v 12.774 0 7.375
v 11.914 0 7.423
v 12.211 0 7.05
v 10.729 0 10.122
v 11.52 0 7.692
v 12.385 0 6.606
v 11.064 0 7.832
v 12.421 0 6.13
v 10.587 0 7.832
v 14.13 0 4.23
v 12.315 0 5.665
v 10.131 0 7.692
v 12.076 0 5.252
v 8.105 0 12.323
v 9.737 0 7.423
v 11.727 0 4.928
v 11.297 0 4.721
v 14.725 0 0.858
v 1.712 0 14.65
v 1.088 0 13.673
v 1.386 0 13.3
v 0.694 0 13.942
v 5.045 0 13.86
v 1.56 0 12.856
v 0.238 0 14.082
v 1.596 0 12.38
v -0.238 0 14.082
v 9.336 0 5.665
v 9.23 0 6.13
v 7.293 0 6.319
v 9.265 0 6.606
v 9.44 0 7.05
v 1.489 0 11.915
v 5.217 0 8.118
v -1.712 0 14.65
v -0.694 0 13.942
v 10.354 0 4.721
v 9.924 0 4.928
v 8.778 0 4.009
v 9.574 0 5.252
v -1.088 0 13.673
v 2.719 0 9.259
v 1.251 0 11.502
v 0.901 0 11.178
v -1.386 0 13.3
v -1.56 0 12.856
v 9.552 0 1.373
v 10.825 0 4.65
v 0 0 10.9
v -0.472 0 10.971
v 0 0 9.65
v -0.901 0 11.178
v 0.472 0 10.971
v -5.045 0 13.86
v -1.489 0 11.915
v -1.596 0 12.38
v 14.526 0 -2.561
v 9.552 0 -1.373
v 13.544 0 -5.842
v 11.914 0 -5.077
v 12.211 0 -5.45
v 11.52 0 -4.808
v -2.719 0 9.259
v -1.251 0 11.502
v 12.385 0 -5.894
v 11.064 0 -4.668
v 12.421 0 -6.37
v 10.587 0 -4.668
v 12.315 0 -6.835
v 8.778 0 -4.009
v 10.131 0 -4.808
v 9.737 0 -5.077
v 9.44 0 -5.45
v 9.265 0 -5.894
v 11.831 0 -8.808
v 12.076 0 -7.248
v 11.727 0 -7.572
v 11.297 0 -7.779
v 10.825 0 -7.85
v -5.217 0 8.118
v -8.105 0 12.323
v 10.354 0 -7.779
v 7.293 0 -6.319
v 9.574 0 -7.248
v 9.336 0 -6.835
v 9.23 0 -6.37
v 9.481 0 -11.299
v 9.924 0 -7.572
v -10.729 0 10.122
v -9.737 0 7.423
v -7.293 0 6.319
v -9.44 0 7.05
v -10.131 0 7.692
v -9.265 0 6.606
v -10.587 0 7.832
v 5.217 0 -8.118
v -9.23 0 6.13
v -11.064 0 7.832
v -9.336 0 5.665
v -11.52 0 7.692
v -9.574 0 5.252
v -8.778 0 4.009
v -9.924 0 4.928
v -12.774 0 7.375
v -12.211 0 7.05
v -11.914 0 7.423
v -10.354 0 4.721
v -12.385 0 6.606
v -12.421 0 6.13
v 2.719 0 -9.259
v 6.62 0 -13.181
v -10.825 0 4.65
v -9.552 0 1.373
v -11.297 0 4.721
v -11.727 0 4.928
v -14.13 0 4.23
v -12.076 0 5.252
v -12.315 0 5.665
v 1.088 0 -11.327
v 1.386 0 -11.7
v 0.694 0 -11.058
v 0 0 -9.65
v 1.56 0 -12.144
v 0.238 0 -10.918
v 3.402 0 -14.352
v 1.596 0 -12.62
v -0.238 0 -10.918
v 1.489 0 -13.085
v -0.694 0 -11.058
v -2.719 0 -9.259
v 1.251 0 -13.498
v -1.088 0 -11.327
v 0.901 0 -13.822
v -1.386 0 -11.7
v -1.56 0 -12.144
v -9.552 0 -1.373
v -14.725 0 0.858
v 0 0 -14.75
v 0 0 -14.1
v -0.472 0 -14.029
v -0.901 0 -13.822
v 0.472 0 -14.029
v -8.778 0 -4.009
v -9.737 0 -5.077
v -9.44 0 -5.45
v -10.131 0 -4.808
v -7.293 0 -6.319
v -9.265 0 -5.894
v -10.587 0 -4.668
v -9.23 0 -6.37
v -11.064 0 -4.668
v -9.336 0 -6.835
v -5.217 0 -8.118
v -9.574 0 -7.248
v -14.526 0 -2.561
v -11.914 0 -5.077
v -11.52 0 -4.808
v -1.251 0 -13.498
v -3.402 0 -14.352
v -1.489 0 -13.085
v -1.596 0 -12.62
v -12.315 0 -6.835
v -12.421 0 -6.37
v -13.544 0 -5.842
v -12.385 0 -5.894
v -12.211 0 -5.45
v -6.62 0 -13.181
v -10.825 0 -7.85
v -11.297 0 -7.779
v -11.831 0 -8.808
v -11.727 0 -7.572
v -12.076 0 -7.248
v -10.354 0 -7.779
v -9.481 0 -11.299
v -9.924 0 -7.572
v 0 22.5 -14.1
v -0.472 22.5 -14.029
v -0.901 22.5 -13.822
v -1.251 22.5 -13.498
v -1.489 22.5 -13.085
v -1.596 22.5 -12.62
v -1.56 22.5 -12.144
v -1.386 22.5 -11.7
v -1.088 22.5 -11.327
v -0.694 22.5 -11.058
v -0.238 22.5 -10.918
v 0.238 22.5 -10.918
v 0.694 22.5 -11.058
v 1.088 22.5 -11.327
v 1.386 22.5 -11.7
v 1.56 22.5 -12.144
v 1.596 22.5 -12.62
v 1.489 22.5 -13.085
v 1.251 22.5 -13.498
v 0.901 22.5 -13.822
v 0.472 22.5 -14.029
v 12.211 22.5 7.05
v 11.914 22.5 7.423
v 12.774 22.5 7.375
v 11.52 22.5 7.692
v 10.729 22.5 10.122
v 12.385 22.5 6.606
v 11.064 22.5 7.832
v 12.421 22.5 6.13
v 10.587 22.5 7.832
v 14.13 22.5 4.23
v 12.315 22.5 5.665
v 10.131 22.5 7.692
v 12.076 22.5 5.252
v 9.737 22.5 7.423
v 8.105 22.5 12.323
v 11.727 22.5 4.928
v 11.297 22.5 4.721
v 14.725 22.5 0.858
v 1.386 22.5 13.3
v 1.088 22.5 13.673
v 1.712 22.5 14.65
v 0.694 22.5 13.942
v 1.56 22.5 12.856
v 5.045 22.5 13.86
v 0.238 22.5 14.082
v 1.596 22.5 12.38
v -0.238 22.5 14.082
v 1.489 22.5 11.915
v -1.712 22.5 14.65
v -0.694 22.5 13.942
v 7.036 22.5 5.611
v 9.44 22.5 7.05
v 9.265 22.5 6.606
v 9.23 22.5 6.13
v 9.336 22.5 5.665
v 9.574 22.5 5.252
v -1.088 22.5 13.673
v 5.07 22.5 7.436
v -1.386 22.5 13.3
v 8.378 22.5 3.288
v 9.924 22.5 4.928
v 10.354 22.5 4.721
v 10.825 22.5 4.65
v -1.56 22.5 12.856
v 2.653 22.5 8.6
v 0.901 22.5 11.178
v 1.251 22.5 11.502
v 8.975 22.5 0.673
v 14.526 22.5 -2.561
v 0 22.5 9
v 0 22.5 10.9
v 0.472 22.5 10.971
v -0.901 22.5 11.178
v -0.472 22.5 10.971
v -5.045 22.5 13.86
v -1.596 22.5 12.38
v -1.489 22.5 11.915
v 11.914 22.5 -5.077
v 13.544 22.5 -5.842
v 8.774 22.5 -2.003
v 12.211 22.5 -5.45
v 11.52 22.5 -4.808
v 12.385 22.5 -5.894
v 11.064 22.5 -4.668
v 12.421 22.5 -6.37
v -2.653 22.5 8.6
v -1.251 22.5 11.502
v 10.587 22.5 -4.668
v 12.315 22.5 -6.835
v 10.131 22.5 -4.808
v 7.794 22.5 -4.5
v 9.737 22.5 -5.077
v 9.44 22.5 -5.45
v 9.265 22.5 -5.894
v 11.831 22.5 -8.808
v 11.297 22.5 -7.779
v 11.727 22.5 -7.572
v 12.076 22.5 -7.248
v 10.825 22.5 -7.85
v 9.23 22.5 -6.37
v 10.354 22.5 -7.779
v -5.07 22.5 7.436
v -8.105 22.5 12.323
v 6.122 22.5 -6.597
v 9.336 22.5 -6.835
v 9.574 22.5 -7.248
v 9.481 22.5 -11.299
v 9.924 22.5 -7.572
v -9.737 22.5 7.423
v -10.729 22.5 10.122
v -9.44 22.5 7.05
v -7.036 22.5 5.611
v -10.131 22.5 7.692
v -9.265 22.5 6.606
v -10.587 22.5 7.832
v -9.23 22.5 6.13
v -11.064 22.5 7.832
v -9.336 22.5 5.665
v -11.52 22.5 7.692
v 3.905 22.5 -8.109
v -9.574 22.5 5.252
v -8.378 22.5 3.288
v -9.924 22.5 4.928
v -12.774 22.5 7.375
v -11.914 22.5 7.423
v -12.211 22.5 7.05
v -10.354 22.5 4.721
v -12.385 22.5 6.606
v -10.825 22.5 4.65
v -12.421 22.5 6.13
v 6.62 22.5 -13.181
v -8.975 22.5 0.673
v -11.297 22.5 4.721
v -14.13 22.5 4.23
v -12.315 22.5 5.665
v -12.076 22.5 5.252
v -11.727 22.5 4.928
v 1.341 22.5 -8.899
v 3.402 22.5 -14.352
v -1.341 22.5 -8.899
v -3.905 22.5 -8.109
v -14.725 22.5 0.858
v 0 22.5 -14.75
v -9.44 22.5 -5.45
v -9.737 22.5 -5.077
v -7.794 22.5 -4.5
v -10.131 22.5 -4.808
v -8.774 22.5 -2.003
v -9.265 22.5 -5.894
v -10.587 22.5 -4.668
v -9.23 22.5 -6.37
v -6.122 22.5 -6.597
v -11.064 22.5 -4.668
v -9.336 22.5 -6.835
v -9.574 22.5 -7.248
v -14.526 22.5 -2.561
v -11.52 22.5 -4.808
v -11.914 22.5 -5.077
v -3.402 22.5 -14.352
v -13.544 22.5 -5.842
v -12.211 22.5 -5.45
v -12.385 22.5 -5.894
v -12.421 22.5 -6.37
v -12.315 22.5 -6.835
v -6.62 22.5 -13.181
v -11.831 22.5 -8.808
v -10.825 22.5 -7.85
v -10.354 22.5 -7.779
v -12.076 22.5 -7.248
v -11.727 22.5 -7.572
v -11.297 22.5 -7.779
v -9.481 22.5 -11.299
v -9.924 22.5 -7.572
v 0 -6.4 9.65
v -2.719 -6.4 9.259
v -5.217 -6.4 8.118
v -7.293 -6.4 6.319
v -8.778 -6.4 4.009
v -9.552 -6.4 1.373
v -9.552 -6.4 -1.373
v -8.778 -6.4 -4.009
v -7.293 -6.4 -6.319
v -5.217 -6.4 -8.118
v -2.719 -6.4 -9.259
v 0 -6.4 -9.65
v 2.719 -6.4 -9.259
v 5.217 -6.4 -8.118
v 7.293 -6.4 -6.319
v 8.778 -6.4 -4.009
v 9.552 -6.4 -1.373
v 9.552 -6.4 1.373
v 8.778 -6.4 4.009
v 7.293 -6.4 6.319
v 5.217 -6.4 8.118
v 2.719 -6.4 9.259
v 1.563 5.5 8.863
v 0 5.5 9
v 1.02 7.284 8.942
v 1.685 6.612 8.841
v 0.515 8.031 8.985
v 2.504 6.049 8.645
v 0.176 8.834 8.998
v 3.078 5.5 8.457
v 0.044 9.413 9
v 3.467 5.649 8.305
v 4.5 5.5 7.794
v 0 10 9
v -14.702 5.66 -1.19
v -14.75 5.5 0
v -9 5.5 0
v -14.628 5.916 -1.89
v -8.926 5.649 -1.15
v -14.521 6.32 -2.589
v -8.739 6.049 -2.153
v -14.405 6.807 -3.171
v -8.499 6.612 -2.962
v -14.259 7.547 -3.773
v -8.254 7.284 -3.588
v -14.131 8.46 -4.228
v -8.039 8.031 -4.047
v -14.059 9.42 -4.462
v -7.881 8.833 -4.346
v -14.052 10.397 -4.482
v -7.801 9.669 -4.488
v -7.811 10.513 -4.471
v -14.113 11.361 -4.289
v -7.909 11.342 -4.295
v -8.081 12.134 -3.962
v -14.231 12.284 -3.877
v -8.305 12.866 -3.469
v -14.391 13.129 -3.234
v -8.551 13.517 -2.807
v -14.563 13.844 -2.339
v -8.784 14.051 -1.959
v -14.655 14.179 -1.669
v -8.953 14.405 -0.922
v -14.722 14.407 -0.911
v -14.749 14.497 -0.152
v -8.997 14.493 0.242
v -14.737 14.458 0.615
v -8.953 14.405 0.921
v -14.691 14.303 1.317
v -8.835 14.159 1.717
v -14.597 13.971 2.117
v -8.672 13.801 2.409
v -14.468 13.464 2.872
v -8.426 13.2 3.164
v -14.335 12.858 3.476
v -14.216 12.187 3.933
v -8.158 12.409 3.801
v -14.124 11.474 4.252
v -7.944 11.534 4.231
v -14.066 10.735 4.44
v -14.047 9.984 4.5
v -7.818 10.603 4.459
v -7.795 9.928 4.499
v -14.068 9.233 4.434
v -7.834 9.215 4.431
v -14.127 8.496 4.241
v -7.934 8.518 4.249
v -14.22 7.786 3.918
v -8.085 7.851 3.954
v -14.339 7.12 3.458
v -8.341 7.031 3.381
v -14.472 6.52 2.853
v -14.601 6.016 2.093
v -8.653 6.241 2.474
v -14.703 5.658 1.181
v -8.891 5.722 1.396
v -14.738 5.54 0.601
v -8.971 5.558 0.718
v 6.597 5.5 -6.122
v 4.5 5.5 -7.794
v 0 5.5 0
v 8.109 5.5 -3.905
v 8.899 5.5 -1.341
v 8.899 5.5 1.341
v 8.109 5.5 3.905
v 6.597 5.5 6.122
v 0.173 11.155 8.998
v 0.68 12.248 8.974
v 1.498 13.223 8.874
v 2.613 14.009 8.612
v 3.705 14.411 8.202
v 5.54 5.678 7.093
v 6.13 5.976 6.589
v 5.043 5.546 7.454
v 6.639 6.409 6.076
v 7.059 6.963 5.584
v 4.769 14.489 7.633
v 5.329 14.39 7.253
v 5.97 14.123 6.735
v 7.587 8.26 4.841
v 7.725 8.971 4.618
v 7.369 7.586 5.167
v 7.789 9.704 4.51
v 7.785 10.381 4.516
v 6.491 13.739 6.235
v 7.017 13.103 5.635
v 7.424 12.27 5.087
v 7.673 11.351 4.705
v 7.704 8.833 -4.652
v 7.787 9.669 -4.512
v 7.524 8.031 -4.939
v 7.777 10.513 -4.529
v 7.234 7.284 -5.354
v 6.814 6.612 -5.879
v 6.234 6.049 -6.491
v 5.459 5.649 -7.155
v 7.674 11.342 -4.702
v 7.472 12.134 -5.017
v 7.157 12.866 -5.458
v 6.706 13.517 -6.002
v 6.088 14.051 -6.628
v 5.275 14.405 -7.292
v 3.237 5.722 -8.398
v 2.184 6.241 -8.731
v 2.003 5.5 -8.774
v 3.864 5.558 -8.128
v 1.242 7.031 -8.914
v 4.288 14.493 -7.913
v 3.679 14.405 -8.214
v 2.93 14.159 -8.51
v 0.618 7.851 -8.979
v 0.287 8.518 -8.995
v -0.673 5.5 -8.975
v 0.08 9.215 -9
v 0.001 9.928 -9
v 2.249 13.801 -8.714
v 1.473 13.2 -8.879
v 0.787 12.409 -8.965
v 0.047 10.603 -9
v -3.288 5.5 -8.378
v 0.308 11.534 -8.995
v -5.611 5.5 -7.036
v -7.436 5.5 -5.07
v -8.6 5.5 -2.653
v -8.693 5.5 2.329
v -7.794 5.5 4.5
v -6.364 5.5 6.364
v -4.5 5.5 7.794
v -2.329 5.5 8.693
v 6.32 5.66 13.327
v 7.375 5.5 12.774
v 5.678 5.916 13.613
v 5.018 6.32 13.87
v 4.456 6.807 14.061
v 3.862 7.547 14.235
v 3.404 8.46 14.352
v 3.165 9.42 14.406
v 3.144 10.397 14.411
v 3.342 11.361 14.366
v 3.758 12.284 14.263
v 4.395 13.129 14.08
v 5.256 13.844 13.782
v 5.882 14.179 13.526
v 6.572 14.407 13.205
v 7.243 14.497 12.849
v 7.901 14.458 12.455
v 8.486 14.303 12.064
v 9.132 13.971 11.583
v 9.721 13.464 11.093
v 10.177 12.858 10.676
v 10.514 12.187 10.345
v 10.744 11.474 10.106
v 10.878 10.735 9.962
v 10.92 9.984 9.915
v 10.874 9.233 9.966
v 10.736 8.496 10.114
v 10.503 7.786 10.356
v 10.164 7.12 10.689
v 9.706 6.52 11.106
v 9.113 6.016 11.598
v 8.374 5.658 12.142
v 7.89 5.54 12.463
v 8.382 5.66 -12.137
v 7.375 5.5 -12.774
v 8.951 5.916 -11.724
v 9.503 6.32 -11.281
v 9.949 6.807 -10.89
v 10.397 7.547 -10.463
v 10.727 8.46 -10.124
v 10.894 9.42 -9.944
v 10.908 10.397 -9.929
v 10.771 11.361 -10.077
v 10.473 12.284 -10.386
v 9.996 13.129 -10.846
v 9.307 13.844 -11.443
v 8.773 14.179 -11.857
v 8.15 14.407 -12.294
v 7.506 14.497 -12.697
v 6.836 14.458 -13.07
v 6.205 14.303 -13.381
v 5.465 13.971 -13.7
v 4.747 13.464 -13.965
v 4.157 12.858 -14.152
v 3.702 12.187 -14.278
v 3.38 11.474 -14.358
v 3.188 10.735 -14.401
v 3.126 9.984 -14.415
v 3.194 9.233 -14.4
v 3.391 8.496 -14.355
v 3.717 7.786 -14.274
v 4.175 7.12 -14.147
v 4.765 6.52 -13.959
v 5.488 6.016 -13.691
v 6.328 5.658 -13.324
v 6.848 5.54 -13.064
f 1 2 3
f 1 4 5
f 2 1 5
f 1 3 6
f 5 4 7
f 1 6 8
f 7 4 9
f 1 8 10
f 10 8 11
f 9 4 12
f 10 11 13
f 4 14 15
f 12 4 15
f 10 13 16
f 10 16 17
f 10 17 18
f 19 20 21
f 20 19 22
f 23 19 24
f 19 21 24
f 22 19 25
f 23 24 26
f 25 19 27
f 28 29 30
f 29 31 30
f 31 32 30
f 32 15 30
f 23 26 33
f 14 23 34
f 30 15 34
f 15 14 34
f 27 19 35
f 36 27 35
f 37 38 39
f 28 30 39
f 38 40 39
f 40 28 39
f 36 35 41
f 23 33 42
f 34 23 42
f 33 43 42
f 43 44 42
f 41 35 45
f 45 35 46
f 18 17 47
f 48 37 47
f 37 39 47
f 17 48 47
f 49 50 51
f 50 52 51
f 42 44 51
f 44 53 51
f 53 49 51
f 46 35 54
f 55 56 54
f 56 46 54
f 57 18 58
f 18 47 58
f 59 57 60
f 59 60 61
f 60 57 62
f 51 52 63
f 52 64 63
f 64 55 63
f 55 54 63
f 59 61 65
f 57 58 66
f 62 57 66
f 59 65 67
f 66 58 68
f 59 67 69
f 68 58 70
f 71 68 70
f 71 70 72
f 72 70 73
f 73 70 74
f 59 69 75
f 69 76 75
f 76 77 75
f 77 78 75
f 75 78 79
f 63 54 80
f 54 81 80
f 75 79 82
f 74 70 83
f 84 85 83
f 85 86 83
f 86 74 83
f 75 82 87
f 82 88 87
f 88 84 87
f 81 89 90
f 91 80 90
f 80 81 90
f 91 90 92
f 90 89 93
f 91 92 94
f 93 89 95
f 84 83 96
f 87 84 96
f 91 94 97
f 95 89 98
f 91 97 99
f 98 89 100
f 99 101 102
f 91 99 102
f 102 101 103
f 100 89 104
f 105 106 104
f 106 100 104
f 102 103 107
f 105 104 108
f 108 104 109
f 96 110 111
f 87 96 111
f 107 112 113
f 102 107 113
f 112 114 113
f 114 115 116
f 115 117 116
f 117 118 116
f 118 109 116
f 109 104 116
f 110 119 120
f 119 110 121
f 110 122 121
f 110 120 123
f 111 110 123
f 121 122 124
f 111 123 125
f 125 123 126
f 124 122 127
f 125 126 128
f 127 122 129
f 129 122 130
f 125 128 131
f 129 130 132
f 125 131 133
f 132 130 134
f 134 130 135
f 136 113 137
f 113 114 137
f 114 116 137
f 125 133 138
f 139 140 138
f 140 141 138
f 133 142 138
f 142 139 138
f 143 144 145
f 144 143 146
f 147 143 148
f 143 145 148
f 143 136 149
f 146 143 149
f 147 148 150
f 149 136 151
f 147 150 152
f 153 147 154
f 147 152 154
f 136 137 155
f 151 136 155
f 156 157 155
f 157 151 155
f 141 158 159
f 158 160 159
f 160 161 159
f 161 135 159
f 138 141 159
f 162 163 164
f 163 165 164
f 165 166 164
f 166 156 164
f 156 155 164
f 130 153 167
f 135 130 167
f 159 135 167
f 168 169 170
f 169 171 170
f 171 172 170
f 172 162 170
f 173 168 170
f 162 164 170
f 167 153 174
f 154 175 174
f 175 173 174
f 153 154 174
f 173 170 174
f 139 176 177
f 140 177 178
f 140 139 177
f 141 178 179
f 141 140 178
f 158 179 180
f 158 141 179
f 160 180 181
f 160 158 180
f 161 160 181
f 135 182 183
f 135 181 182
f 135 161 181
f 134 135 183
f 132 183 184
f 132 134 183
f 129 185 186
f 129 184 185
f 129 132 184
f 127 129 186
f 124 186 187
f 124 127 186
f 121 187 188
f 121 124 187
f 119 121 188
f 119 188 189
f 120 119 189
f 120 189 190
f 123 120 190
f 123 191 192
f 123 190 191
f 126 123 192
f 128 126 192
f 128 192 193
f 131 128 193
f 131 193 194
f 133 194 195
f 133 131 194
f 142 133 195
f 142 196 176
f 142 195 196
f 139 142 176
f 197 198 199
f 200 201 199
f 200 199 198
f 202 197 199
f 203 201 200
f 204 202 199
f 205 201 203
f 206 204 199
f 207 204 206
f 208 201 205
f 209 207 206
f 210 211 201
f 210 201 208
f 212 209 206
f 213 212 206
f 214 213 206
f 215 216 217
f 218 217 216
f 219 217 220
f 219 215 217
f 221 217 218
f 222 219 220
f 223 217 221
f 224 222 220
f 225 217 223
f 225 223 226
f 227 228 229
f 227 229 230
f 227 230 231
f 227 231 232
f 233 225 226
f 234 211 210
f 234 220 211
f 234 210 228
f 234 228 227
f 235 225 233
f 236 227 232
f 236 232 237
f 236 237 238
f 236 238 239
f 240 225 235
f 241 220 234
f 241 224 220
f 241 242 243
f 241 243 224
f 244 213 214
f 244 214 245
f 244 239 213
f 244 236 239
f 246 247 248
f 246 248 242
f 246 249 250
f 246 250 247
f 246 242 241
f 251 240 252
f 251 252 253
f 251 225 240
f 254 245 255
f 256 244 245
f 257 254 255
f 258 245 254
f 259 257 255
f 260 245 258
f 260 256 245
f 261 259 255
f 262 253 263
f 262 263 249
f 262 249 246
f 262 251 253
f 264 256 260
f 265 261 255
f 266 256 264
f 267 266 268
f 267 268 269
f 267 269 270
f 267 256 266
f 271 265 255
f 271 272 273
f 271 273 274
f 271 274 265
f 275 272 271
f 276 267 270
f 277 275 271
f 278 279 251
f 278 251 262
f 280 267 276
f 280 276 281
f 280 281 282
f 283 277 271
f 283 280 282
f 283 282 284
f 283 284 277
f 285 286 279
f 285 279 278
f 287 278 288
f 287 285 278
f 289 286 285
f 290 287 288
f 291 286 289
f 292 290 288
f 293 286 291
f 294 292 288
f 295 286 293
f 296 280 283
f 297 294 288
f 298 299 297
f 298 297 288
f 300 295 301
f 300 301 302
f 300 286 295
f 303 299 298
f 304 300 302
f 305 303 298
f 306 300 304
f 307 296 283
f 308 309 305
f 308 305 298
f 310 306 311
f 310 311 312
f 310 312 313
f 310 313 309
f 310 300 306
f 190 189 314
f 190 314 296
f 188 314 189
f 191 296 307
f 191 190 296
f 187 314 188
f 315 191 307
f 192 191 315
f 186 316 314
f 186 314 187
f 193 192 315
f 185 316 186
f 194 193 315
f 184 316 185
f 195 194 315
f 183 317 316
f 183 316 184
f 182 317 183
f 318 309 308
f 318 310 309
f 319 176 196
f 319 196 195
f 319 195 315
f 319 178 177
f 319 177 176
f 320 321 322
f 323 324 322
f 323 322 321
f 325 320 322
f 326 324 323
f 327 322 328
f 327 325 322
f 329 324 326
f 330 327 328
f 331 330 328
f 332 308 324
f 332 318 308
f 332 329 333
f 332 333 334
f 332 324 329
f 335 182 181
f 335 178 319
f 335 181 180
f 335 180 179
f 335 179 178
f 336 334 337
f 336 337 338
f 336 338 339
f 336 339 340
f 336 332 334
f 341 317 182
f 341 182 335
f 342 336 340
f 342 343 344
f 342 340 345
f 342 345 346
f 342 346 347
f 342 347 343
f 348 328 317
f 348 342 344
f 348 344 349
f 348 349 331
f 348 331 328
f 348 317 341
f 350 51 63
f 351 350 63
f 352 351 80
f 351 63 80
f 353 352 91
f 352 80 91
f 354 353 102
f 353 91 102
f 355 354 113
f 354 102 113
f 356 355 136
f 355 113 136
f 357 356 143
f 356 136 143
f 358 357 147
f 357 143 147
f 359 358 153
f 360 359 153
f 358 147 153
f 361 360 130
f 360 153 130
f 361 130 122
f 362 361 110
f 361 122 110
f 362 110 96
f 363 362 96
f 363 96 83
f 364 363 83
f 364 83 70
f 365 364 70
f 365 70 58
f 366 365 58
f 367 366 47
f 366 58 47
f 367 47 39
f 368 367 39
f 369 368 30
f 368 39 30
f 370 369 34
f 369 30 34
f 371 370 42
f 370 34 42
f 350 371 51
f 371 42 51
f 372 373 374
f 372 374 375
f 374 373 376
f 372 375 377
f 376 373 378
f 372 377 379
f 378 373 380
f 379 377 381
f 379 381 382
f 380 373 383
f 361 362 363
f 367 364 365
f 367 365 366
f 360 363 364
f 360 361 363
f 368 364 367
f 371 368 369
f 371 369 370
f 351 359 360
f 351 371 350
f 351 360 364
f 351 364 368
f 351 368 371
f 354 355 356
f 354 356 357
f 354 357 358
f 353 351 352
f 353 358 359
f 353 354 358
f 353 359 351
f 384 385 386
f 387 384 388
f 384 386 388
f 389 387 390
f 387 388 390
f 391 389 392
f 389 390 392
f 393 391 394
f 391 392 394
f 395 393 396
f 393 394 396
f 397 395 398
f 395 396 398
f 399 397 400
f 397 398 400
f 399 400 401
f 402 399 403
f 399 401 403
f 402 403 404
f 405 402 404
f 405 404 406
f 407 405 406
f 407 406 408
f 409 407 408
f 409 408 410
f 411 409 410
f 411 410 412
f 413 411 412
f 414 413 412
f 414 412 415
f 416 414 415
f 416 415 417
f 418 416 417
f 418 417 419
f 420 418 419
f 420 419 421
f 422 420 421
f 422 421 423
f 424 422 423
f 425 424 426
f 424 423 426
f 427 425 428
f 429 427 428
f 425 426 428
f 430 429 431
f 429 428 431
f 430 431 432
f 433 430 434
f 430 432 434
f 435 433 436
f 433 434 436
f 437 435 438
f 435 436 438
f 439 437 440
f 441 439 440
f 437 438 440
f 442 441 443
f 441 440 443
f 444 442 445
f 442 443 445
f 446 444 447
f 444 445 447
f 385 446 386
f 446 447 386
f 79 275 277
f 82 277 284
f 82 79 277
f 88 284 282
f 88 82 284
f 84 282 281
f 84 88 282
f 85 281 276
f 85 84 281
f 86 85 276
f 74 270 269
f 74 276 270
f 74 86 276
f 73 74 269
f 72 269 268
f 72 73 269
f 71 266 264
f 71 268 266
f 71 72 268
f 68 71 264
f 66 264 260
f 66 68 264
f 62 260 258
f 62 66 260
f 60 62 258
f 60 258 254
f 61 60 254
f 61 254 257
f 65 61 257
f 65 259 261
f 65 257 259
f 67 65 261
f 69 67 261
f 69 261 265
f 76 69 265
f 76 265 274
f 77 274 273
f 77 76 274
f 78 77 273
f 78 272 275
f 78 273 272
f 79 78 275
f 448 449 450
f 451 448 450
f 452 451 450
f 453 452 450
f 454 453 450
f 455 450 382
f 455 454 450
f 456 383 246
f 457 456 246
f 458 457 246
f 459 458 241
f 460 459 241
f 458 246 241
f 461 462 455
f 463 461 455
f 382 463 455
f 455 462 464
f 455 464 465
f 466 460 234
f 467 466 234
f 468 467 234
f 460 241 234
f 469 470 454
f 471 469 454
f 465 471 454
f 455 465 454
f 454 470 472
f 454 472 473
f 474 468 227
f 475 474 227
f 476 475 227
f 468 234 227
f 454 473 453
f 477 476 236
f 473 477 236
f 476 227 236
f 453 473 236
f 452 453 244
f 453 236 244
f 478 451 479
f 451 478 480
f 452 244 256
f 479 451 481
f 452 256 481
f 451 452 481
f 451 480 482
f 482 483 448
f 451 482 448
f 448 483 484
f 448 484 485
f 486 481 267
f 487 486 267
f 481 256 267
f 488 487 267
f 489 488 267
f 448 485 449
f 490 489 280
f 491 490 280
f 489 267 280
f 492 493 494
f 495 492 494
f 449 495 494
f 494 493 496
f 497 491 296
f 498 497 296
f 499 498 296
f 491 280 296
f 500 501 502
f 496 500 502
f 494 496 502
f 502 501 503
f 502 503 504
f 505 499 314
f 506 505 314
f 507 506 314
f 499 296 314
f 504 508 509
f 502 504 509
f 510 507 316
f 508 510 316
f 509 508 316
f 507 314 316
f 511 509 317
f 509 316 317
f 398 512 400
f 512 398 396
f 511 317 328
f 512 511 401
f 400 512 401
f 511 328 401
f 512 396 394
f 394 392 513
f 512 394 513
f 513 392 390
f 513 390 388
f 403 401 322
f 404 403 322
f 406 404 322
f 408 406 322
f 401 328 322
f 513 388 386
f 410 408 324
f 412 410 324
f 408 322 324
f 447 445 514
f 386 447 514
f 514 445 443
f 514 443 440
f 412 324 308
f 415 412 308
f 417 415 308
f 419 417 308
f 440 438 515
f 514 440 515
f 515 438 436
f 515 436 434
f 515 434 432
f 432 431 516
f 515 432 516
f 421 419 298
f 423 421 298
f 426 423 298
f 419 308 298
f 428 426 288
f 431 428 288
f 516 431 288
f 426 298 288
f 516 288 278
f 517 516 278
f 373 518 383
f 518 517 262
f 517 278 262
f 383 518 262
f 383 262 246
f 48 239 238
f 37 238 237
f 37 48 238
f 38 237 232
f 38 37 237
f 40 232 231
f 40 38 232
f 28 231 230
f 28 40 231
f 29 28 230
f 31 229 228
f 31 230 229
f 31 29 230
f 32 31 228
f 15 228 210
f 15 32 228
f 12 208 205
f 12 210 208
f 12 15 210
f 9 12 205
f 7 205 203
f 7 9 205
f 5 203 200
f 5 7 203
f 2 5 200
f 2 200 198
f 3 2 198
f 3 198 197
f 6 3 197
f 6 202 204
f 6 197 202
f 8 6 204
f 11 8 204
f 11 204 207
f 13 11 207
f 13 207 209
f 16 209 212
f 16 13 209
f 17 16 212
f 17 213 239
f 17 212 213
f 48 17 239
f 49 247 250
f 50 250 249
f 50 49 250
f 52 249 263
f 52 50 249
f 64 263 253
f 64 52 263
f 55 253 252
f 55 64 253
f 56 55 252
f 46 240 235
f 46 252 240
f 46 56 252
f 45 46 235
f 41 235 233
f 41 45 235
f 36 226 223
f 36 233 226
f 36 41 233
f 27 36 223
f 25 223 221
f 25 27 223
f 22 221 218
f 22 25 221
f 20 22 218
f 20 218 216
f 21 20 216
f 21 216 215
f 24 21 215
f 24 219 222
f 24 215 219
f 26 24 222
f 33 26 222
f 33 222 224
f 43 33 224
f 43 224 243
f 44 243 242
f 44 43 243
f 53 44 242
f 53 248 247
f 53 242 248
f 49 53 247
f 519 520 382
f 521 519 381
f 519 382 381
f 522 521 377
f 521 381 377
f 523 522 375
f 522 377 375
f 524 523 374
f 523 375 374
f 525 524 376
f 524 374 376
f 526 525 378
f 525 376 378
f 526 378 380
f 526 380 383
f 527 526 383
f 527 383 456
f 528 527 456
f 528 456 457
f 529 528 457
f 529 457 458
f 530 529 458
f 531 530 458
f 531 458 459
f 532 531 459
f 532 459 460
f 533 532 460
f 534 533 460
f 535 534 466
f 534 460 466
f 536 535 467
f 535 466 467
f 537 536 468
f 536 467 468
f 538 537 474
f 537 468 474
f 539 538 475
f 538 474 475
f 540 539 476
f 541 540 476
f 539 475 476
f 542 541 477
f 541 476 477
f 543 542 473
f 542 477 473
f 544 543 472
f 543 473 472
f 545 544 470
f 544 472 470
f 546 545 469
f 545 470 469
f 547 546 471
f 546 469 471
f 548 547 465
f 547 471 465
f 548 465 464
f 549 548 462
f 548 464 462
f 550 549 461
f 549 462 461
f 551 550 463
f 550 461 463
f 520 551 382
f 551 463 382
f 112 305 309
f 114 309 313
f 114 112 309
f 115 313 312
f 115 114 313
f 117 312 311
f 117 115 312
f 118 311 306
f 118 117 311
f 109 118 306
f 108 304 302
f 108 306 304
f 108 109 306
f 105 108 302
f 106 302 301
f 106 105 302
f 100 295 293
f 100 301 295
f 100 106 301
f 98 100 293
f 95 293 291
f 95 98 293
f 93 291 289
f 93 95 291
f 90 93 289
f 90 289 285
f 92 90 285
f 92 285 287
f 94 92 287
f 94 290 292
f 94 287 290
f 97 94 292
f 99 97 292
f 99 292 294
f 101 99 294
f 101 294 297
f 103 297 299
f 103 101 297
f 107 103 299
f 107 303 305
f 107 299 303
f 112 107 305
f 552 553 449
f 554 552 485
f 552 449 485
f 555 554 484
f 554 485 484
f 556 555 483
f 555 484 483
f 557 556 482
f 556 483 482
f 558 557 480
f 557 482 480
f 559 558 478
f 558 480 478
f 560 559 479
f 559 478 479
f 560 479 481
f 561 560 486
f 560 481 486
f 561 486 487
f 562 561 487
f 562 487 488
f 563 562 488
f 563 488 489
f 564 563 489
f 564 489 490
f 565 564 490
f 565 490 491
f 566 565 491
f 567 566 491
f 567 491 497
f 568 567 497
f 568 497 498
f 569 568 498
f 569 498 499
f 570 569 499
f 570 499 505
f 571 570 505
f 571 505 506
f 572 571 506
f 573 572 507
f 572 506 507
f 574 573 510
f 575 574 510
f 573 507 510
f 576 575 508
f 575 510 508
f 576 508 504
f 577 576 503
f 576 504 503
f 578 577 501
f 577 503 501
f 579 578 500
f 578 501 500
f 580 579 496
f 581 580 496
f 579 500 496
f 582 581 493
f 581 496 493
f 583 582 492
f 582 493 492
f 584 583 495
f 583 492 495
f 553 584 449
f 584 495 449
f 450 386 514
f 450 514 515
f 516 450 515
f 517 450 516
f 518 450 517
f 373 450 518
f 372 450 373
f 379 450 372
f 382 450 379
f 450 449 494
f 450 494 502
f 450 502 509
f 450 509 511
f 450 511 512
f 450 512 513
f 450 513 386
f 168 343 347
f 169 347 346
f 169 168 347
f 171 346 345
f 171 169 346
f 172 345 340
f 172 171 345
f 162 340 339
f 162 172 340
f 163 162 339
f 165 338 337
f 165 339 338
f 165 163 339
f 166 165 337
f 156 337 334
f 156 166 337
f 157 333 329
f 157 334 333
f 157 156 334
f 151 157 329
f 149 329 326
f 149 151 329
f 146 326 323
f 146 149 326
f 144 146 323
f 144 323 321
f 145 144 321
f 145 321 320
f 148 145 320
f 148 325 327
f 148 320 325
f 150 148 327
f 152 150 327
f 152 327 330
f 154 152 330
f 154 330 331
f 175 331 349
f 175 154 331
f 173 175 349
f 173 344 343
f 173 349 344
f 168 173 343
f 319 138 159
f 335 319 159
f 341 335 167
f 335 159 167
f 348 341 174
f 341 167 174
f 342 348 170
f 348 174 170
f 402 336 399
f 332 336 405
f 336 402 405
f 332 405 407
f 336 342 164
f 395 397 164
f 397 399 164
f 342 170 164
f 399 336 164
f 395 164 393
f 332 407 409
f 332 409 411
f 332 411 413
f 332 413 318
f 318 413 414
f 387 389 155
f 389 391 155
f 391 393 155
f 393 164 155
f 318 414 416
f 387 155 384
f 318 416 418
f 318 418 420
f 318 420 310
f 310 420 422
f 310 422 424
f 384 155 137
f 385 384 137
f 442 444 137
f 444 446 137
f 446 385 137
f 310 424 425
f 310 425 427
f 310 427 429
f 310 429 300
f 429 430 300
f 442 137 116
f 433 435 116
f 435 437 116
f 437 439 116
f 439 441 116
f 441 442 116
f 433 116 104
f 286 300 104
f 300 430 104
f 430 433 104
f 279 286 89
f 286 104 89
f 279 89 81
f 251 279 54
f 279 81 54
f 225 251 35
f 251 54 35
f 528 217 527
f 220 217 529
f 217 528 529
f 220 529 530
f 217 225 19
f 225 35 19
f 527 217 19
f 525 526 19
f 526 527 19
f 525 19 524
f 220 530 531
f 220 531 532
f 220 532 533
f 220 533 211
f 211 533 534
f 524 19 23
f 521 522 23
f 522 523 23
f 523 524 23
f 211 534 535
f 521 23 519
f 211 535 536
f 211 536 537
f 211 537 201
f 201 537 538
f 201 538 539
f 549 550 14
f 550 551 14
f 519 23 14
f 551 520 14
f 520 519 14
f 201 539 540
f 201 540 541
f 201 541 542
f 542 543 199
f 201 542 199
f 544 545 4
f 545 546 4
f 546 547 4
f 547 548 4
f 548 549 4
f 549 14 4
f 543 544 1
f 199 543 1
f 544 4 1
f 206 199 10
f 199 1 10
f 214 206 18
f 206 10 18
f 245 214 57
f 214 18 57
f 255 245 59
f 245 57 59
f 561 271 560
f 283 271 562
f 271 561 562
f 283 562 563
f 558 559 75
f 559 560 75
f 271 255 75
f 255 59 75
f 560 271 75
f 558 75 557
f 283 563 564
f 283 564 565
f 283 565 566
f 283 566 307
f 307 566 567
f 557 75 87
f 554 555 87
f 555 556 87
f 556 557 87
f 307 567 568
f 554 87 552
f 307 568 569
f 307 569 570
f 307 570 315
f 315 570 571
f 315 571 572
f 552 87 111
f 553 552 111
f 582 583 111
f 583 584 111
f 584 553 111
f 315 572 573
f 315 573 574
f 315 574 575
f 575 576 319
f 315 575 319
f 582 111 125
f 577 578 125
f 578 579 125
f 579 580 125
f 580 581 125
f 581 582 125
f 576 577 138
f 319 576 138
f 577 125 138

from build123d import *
from build123d.topology import SkipClean

# Parameters (mm, degrees)
SKETCH_1_R               = 14.75
EXTRUDE_1_DEPTH          = 22.5
SKETCH_3_R               = 1.6
CUT_EXTRUDE_1_DEPTH      = 31.681835017
SKETCH_5_R               = 9.65
EXTRUDE_2_DEPTH          = 6.4
SKETCH_6_R               = 9
CUT_EXTRUDE_2_DEPTH      = 17
SKETCH_9_R               = 4.5
CUT_EXTRUDE_3_DEPTH      = 31.681835017
PATTERN_CIRCULAR_1_COUNT = 3


with BuildPart() as part:
    # 草图1 → 凸台-拉伸1 (new body)
    with BuildSketch(Plane(origin=(0, 0, 0), x_dir=(1, 0, 0), z_dir=(0, 1, 0))):
        with Locations(Location((0, 0, 0), (0, 0, 90))):
            Circle(SKETCH_1_R)
    extrude(amount=EXTRUDE_1_DEPTH)

    # 草图3 → 切除-拉伸1 (cut, through all)
    with BuildSketch(Plane(origin=(0, 0, 0), x_dir=(1, 0, 0), z_dir=(0, 1, 0))):
        with Locations(Location((0, 12.5, 0), (0, 0, 90))):
            Circle(SKETCH_3_R)
        with Locations(Location((10.825317547, 6.25, 0), (0, 0, 90))):
            Circle(SKETCH_3_R)
        with Locations(Location((10.825317547, -6.25, 0), (0, 0, 90))):
            Circle(SKETCH_3_R)
        with Locations(Location((0, -12.5, 0), (0, 0, 90))):
            Circle(SKETCH_3_R)
        with Locations(Location((-10.825317547, -6.25, 0), (0, 0, 90))):
            Circle(SKETCH_3_R)
        with Locations(Location((-10.825317547, 6.25, 0), (0, 0, 90))):
            Circle(SKETCH_3_R)
    extrude(amount=CUT_EXTRUDE_1_DEPTH, mode=Mode.SUBTRACT)

    # 草图5 → 凸台-拉伸2 (add)
    with BuildSketch(Plane.XZ):
        with Locations(Location((0, 0, 0), (0, 0, 90))):
            Circle(SKETCH_5_R)
    extrude(amount=EXTRUDE_2_DEPTH)

    # 草图6 → 切除-拉伸2 (cut)
    with BuildSketch(Plane(origin=(0, 22.5, 0), x_dir=(1, 0, 0), z_dir=(0, 1, 0))):
        with Locations(Location((0, 0, 0), (0, 0, 270))):
            Circle(SKETCH_6_R)
    extrude(amount=-CUT_EXTRUDE_2_DEPTH, mode=Mode.SUBTRACT)

    # 草图9 → 切除-拉伸3 (cut, through all)
    with BuildSketch(Plane(origin=(0, 0, 0), x_dir=(0, 0, -1), z_dir=(1, 0, 0))):
        with Locations(Location((0, 10, 0), (0, 0, 270))):
            Circle(SKETCH_9_R)
    cut_extrude_3 = extrude(amount=-CUT_EXTRUDE_3_DEPTH, mode=Mode.SUBTRACT)

    # 阵列(圆周)1: 切除-拉伸3 ×3 about axis
    with SkipClean():  # the faces are left unmerged after this step: merging them gives an invalid solid
        pattern_circular_1_axis = Axis((0, 22.5, 0), (0, 1, 0))
        for i in range(1, PATTERN_CIRCULAR_1_COUNT):
            add(cut_extrude_3.rotate(pattern_circular_1_axis, i * 360 / PATTERN_CIRCULAR_1_COUNT), mode=Mode.SUBTRACT)


solid = part.part
